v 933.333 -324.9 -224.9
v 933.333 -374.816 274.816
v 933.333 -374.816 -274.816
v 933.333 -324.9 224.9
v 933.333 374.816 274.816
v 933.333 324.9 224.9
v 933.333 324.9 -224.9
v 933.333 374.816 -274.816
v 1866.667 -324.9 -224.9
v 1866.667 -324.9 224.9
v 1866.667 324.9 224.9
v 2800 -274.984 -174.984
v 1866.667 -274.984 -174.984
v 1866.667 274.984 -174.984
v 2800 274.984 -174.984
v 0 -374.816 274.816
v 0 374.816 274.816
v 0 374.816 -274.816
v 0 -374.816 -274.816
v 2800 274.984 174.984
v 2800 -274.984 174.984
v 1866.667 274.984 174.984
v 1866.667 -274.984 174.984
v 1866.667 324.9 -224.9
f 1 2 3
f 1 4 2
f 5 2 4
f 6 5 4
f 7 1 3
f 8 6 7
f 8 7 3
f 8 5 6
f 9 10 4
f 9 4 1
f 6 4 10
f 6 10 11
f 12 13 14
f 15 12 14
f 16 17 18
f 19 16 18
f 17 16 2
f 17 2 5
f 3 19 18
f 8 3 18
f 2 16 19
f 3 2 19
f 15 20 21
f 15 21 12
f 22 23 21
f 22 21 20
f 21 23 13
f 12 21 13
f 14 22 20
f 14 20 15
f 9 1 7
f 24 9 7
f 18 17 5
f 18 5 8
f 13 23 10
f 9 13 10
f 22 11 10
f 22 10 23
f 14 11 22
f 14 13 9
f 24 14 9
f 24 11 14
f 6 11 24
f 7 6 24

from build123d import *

# Parameters (mm, degrees)
SKETCH1_W           = 549.631
SKETCH1_H           = 749.631
BOSS_EXTRUDE1_DEPTH = 933.333333333
SKETCH2_W           = 449.8
SKETCH2_H           = 649.8
BOSS_EXTRUDE2_DEPTH = 933.333333333
SKETCH3_W           = 349.969
SKETCH3_H           = 549.969
BOSS_EXTRUDE3_DEPTH = 933.333333333


with BuildPart() as part:
    # Sketch1 → Boss-Extrude1 (new body)
    with BuildSketch(Plane(origin=(0, 0, 0), x_dir=(0, 0, -1), z_dir=(1, 0, 0))):
        Rectangle(SKETCH1_W, SKETCH1_H)
    extrude(amount=BOSS_EXTRUDE1_DEPTH)

    # Sketch2 → Boss-Extrude2 (add)
    with BuildSketch(Plane(origin=(933.333333333, 0, 0), x_dir=(0, 0, -1), z_dir=(1, 0, 0))):
        Rectangle(SKETCH2_W, SKETCH2_H)
    extrude(amount=BOSS_EXTRUDE2_DEPTH)

    # Sketch3 → Boss-Extrude3 (add)
    with BuildSketch(Plane(origin=(1866.666666667, 0, 0), x_dir=(0, 0, -1), z_dir=(1, 0, 0))):
        Rectangle(SKETCH3_W, SKETCH3_H)
    extrude(amount=BOSS_EXTRUDE3_DEPTH)


solid = part.part
